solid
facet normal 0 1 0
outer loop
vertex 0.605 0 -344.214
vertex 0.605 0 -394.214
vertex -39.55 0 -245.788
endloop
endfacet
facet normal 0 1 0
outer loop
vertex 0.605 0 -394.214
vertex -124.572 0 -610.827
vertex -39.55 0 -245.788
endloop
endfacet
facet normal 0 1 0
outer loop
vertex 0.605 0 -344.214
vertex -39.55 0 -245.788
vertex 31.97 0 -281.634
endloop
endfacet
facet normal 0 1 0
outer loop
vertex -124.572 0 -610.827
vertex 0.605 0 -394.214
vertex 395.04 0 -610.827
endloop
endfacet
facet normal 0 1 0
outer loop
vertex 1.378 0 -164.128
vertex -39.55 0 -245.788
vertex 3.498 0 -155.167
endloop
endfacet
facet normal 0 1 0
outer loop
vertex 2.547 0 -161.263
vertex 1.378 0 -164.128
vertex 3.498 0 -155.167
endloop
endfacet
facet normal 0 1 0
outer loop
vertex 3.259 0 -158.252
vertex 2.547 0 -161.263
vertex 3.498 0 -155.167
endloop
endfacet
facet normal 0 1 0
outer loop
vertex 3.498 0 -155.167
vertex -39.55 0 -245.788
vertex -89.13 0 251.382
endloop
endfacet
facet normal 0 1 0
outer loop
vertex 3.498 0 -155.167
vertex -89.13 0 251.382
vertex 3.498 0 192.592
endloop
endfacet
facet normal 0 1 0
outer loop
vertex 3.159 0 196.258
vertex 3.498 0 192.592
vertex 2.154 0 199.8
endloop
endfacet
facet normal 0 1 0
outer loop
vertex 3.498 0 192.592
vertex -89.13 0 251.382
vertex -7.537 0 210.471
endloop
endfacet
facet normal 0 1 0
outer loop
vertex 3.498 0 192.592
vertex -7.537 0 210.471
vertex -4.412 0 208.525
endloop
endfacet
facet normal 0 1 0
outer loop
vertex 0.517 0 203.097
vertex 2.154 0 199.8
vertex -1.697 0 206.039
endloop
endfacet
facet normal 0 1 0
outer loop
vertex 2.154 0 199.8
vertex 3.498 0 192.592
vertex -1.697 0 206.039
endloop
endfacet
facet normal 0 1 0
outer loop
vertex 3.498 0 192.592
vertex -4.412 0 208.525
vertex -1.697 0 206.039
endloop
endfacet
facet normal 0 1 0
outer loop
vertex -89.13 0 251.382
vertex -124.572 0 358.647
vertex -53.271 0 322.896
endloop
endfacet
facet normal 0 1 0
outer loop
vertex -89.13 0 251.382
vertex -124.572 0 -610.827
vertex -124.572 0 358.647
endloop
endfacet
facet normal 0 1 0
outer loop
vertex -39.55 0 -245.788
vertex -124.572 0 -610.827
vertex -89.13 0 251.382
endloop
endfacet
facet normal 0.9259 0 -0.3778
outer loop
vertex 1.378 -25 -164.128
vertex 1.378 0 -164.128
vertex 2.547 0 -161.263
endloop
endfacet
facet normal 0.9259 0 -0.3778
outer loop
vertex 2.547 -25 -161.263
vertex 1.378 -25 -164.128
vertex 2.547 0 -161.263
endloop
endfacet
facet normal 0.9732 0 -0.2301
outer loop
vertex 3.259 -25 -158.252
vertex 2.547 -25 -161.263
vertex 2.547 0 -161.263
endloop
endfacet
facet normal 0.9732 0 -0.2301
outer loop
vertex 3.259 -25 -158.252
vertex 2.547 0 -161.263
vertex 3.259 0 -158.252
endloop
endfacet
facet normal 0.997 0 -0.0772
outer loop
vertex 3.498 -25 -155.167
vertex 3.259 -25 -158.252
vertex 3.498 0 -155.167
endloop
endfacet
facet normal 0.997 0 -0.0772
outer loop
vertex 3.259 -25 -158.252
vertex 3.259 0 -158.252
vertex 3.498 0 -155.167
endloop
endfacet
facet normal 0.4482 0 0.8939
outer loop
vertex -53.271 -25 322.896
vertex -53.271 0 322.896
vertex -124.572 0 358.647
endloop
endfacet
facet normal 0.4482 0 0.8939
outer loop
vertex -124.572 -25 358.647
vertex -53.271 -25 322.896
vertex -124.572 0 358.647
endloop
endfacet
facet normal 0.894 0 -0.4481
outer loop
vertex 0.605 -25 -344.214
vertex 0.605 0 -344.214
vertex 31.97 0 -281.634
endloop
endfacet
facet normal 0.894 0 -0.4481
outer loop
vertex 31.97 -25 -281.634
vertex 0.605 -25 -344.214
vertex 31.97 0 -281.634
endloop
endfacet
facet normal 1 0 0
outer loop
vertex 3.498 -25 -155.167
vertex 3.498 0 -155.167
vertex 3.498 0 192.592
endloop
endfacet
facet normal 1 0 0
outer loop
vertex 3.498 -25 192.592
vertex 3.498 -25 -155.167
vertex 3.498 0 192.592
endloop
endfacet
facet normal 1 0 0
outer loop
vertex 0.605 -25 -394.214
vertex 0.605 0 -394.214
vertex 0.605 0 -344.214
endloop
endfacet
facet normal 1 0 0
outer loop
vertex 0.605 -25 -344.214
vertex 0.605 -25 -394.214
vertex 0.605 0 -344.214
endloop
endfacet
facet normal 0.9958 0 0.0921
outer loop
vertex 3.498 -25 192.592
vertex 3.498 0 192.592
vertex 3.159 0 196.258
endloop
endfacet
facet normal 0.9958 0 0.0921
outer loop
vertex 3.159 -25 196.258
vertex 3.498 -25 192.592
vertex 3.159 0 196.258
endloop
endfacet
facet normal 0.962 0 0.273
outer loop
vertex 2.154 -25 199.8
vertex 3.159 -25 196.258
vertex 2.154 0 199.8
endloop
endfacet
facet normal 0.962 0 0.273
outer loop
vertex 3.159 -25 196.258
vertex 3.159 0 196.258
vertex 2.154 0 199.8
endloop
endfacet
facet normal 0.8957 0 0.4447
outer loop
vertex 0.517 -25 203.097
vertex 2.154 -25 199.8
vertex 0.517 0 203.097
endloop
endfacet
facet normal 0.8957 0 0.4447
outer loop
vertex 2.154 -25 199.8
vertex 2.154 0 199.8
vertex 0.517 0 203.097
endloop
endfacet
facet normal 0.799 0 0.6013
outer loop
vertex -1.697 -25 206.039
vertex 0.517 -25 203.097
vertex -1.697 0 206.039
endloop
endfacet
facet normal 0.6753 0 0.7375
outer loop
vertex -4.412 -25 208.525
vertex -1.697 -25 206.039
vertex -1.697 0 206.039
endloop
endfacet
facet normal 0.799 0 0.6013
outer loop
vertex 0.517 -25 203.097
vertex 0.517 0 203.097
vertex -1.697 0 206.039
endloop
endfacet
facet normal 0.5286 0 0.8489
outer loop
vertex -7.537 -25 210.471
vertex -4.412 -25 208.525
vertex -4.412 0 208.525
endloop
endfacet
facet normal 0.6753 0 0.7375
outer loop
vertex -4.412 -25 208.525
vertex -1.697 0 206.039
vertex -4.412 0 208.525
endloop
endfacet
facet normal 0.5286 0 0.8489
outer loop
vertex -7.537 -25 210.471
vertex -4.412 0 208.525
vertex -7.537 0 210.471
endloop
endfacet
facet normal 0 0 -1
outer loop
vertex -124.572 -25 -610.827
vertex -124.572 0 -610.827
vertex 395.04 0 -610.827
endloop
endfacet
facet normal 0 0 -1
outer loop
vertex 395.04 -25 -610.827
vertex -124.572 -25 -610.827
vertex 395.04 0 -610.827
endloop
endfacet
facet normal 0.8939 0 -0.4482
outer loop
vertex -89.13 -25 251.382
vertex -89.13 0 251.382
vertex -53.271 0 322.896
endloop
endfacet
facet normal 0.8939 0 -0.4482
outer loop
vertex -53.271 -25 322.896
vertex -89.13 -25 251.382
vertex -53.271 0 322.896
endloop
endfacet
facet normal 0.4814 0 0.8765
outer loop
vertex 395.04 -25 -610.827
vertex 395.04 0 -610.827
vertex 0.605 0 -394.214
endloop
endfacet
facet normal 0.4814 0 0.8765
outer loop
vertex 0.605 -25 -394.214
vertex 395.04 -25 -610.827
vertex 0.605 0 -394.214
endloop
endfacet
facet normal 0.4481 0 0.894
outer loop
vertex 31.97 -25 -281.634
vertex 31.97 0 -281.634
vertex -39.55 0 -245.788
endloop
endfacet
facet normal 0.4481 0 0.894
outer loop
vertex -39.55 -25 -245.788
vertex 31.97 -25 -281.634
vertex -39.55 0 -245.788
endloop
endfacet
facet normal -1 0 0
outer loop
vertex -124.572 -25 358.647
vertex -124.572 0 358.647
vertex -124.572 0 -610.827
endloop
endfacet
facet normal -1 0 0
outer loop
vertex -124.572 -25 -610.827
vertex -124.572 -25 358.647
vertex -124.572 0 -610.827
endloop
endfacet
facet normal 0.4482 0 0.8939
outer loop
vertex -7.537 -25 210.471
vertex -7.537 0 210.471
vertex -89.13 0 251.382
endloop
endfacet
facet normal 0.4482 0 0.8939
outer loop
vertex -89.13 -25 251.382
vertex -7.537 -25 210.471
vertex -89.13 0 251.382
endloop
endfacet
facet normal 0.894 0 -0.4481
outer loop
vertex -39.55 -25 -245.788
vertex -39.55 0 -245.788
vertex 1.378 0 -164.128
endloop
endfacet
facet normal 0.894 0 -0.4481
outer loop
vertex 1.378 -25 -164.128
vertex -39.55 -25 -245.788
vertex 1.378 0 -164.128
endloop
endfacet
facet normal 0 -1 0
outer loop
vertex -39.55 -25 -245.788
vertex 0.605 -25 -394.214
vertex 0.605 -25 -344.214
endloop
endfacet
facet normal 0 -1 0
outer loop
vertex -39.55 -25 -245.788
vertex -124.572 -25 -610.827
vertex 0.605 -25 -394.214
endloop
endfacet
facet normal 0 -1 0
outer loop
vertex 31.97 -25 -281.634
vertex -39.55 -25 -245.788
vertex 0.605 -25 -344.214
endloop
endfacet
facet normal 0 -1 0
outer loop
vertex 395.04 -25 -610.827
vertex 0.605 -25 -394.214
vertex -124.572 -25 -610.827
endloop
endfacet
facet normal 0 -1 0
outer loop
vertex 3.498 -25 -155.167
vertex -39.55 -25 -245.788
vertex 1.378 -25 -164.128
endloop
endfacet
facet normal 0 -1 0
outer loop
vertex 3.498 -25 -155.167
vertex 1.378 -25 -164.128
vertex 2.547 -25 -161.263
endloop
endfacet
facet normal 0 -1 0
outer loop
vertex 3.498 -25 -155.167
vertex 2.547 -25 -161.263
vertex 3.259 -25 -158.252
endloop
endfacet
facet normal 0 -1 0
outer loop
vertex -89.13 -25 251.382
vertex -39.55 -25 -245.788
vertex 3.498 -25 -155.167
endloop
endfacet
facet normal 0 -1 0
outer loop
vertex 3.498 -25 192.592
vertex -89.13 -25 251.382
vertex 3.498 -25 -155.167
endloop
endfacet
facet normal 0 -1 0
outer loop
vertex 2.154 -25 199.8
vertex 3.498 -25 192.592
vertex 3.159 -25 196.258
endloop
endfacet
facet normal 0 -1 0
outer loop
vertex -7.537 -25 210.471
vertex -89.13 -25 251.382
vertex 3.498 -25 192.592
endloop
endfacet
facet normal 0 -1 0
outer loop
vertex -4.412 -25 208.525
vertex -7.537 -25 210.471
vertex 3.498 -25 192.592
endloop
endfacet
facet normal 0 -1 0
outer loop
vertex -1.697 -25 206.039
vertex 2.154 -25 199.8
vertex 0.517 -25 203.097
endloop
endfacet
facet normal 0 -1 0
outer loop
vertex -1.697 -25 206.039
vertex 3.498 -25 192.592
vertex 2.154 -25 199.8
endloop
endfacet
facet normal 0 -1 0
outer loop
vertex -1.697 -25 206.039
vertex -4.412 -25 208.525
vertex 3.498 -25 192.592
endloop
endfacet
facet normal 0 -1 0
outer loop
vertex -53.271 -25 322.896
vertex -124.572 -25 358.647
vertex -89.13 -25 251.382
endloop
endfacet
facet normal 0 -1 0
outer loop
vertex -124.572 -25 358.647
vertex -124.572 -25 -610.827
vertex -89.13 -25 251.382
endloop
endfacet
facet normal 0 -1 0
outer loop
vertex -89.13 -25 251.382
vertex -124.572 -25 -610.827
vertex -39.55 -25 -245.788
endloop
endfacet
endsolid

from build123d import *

# Parameters (mm, degrees)
F1_DEPTH = 25


with BuildPart() as f1:
    # F0 (on Front) → F1 (new body)
    with BuildSketch(Plane.XZ):
        with BuildLine():
            Line((-124.571604, -610.826684), (395.039996, -610.826684))
            Line((395.039996, -610.826684), (0.605091, -394.213883))
            Line((0.605091, -394.213883), (0.605091, -344.213883))
            Line((0.605091, -344.213883), (31.970073, -281.634031))
            Line((31.970073, -281.634031), (-39.549758, -245.788336))
            Line((-39.549758, -245.788336), (1.378216, -164.12827))
            ThreePointArc((1.378216, -164.12827), (2.961033, -159.771238), (3.498259, -155.166846))
            Line((3.498259, -155.166846), (3.498259, 192.592175))
            ThreePointArc((3.498259, 192.592175), (0.517232, 203.097153), (-7.537197, 210.470568))
            Line((-7.537197, 210.470568), (-89.129627, 251.382462))
            Line((-89.129627, 251.382462), (-53.27145, 322.896036))
            Line((-53.27145, 322.896036), (-124.571604, 358.6472))
            Line((-124.571604, 358.6472), (-124.571604, -610.826684))
        make_face()
    extrude(amount=F1_DEPTH)


solid = f1.part
